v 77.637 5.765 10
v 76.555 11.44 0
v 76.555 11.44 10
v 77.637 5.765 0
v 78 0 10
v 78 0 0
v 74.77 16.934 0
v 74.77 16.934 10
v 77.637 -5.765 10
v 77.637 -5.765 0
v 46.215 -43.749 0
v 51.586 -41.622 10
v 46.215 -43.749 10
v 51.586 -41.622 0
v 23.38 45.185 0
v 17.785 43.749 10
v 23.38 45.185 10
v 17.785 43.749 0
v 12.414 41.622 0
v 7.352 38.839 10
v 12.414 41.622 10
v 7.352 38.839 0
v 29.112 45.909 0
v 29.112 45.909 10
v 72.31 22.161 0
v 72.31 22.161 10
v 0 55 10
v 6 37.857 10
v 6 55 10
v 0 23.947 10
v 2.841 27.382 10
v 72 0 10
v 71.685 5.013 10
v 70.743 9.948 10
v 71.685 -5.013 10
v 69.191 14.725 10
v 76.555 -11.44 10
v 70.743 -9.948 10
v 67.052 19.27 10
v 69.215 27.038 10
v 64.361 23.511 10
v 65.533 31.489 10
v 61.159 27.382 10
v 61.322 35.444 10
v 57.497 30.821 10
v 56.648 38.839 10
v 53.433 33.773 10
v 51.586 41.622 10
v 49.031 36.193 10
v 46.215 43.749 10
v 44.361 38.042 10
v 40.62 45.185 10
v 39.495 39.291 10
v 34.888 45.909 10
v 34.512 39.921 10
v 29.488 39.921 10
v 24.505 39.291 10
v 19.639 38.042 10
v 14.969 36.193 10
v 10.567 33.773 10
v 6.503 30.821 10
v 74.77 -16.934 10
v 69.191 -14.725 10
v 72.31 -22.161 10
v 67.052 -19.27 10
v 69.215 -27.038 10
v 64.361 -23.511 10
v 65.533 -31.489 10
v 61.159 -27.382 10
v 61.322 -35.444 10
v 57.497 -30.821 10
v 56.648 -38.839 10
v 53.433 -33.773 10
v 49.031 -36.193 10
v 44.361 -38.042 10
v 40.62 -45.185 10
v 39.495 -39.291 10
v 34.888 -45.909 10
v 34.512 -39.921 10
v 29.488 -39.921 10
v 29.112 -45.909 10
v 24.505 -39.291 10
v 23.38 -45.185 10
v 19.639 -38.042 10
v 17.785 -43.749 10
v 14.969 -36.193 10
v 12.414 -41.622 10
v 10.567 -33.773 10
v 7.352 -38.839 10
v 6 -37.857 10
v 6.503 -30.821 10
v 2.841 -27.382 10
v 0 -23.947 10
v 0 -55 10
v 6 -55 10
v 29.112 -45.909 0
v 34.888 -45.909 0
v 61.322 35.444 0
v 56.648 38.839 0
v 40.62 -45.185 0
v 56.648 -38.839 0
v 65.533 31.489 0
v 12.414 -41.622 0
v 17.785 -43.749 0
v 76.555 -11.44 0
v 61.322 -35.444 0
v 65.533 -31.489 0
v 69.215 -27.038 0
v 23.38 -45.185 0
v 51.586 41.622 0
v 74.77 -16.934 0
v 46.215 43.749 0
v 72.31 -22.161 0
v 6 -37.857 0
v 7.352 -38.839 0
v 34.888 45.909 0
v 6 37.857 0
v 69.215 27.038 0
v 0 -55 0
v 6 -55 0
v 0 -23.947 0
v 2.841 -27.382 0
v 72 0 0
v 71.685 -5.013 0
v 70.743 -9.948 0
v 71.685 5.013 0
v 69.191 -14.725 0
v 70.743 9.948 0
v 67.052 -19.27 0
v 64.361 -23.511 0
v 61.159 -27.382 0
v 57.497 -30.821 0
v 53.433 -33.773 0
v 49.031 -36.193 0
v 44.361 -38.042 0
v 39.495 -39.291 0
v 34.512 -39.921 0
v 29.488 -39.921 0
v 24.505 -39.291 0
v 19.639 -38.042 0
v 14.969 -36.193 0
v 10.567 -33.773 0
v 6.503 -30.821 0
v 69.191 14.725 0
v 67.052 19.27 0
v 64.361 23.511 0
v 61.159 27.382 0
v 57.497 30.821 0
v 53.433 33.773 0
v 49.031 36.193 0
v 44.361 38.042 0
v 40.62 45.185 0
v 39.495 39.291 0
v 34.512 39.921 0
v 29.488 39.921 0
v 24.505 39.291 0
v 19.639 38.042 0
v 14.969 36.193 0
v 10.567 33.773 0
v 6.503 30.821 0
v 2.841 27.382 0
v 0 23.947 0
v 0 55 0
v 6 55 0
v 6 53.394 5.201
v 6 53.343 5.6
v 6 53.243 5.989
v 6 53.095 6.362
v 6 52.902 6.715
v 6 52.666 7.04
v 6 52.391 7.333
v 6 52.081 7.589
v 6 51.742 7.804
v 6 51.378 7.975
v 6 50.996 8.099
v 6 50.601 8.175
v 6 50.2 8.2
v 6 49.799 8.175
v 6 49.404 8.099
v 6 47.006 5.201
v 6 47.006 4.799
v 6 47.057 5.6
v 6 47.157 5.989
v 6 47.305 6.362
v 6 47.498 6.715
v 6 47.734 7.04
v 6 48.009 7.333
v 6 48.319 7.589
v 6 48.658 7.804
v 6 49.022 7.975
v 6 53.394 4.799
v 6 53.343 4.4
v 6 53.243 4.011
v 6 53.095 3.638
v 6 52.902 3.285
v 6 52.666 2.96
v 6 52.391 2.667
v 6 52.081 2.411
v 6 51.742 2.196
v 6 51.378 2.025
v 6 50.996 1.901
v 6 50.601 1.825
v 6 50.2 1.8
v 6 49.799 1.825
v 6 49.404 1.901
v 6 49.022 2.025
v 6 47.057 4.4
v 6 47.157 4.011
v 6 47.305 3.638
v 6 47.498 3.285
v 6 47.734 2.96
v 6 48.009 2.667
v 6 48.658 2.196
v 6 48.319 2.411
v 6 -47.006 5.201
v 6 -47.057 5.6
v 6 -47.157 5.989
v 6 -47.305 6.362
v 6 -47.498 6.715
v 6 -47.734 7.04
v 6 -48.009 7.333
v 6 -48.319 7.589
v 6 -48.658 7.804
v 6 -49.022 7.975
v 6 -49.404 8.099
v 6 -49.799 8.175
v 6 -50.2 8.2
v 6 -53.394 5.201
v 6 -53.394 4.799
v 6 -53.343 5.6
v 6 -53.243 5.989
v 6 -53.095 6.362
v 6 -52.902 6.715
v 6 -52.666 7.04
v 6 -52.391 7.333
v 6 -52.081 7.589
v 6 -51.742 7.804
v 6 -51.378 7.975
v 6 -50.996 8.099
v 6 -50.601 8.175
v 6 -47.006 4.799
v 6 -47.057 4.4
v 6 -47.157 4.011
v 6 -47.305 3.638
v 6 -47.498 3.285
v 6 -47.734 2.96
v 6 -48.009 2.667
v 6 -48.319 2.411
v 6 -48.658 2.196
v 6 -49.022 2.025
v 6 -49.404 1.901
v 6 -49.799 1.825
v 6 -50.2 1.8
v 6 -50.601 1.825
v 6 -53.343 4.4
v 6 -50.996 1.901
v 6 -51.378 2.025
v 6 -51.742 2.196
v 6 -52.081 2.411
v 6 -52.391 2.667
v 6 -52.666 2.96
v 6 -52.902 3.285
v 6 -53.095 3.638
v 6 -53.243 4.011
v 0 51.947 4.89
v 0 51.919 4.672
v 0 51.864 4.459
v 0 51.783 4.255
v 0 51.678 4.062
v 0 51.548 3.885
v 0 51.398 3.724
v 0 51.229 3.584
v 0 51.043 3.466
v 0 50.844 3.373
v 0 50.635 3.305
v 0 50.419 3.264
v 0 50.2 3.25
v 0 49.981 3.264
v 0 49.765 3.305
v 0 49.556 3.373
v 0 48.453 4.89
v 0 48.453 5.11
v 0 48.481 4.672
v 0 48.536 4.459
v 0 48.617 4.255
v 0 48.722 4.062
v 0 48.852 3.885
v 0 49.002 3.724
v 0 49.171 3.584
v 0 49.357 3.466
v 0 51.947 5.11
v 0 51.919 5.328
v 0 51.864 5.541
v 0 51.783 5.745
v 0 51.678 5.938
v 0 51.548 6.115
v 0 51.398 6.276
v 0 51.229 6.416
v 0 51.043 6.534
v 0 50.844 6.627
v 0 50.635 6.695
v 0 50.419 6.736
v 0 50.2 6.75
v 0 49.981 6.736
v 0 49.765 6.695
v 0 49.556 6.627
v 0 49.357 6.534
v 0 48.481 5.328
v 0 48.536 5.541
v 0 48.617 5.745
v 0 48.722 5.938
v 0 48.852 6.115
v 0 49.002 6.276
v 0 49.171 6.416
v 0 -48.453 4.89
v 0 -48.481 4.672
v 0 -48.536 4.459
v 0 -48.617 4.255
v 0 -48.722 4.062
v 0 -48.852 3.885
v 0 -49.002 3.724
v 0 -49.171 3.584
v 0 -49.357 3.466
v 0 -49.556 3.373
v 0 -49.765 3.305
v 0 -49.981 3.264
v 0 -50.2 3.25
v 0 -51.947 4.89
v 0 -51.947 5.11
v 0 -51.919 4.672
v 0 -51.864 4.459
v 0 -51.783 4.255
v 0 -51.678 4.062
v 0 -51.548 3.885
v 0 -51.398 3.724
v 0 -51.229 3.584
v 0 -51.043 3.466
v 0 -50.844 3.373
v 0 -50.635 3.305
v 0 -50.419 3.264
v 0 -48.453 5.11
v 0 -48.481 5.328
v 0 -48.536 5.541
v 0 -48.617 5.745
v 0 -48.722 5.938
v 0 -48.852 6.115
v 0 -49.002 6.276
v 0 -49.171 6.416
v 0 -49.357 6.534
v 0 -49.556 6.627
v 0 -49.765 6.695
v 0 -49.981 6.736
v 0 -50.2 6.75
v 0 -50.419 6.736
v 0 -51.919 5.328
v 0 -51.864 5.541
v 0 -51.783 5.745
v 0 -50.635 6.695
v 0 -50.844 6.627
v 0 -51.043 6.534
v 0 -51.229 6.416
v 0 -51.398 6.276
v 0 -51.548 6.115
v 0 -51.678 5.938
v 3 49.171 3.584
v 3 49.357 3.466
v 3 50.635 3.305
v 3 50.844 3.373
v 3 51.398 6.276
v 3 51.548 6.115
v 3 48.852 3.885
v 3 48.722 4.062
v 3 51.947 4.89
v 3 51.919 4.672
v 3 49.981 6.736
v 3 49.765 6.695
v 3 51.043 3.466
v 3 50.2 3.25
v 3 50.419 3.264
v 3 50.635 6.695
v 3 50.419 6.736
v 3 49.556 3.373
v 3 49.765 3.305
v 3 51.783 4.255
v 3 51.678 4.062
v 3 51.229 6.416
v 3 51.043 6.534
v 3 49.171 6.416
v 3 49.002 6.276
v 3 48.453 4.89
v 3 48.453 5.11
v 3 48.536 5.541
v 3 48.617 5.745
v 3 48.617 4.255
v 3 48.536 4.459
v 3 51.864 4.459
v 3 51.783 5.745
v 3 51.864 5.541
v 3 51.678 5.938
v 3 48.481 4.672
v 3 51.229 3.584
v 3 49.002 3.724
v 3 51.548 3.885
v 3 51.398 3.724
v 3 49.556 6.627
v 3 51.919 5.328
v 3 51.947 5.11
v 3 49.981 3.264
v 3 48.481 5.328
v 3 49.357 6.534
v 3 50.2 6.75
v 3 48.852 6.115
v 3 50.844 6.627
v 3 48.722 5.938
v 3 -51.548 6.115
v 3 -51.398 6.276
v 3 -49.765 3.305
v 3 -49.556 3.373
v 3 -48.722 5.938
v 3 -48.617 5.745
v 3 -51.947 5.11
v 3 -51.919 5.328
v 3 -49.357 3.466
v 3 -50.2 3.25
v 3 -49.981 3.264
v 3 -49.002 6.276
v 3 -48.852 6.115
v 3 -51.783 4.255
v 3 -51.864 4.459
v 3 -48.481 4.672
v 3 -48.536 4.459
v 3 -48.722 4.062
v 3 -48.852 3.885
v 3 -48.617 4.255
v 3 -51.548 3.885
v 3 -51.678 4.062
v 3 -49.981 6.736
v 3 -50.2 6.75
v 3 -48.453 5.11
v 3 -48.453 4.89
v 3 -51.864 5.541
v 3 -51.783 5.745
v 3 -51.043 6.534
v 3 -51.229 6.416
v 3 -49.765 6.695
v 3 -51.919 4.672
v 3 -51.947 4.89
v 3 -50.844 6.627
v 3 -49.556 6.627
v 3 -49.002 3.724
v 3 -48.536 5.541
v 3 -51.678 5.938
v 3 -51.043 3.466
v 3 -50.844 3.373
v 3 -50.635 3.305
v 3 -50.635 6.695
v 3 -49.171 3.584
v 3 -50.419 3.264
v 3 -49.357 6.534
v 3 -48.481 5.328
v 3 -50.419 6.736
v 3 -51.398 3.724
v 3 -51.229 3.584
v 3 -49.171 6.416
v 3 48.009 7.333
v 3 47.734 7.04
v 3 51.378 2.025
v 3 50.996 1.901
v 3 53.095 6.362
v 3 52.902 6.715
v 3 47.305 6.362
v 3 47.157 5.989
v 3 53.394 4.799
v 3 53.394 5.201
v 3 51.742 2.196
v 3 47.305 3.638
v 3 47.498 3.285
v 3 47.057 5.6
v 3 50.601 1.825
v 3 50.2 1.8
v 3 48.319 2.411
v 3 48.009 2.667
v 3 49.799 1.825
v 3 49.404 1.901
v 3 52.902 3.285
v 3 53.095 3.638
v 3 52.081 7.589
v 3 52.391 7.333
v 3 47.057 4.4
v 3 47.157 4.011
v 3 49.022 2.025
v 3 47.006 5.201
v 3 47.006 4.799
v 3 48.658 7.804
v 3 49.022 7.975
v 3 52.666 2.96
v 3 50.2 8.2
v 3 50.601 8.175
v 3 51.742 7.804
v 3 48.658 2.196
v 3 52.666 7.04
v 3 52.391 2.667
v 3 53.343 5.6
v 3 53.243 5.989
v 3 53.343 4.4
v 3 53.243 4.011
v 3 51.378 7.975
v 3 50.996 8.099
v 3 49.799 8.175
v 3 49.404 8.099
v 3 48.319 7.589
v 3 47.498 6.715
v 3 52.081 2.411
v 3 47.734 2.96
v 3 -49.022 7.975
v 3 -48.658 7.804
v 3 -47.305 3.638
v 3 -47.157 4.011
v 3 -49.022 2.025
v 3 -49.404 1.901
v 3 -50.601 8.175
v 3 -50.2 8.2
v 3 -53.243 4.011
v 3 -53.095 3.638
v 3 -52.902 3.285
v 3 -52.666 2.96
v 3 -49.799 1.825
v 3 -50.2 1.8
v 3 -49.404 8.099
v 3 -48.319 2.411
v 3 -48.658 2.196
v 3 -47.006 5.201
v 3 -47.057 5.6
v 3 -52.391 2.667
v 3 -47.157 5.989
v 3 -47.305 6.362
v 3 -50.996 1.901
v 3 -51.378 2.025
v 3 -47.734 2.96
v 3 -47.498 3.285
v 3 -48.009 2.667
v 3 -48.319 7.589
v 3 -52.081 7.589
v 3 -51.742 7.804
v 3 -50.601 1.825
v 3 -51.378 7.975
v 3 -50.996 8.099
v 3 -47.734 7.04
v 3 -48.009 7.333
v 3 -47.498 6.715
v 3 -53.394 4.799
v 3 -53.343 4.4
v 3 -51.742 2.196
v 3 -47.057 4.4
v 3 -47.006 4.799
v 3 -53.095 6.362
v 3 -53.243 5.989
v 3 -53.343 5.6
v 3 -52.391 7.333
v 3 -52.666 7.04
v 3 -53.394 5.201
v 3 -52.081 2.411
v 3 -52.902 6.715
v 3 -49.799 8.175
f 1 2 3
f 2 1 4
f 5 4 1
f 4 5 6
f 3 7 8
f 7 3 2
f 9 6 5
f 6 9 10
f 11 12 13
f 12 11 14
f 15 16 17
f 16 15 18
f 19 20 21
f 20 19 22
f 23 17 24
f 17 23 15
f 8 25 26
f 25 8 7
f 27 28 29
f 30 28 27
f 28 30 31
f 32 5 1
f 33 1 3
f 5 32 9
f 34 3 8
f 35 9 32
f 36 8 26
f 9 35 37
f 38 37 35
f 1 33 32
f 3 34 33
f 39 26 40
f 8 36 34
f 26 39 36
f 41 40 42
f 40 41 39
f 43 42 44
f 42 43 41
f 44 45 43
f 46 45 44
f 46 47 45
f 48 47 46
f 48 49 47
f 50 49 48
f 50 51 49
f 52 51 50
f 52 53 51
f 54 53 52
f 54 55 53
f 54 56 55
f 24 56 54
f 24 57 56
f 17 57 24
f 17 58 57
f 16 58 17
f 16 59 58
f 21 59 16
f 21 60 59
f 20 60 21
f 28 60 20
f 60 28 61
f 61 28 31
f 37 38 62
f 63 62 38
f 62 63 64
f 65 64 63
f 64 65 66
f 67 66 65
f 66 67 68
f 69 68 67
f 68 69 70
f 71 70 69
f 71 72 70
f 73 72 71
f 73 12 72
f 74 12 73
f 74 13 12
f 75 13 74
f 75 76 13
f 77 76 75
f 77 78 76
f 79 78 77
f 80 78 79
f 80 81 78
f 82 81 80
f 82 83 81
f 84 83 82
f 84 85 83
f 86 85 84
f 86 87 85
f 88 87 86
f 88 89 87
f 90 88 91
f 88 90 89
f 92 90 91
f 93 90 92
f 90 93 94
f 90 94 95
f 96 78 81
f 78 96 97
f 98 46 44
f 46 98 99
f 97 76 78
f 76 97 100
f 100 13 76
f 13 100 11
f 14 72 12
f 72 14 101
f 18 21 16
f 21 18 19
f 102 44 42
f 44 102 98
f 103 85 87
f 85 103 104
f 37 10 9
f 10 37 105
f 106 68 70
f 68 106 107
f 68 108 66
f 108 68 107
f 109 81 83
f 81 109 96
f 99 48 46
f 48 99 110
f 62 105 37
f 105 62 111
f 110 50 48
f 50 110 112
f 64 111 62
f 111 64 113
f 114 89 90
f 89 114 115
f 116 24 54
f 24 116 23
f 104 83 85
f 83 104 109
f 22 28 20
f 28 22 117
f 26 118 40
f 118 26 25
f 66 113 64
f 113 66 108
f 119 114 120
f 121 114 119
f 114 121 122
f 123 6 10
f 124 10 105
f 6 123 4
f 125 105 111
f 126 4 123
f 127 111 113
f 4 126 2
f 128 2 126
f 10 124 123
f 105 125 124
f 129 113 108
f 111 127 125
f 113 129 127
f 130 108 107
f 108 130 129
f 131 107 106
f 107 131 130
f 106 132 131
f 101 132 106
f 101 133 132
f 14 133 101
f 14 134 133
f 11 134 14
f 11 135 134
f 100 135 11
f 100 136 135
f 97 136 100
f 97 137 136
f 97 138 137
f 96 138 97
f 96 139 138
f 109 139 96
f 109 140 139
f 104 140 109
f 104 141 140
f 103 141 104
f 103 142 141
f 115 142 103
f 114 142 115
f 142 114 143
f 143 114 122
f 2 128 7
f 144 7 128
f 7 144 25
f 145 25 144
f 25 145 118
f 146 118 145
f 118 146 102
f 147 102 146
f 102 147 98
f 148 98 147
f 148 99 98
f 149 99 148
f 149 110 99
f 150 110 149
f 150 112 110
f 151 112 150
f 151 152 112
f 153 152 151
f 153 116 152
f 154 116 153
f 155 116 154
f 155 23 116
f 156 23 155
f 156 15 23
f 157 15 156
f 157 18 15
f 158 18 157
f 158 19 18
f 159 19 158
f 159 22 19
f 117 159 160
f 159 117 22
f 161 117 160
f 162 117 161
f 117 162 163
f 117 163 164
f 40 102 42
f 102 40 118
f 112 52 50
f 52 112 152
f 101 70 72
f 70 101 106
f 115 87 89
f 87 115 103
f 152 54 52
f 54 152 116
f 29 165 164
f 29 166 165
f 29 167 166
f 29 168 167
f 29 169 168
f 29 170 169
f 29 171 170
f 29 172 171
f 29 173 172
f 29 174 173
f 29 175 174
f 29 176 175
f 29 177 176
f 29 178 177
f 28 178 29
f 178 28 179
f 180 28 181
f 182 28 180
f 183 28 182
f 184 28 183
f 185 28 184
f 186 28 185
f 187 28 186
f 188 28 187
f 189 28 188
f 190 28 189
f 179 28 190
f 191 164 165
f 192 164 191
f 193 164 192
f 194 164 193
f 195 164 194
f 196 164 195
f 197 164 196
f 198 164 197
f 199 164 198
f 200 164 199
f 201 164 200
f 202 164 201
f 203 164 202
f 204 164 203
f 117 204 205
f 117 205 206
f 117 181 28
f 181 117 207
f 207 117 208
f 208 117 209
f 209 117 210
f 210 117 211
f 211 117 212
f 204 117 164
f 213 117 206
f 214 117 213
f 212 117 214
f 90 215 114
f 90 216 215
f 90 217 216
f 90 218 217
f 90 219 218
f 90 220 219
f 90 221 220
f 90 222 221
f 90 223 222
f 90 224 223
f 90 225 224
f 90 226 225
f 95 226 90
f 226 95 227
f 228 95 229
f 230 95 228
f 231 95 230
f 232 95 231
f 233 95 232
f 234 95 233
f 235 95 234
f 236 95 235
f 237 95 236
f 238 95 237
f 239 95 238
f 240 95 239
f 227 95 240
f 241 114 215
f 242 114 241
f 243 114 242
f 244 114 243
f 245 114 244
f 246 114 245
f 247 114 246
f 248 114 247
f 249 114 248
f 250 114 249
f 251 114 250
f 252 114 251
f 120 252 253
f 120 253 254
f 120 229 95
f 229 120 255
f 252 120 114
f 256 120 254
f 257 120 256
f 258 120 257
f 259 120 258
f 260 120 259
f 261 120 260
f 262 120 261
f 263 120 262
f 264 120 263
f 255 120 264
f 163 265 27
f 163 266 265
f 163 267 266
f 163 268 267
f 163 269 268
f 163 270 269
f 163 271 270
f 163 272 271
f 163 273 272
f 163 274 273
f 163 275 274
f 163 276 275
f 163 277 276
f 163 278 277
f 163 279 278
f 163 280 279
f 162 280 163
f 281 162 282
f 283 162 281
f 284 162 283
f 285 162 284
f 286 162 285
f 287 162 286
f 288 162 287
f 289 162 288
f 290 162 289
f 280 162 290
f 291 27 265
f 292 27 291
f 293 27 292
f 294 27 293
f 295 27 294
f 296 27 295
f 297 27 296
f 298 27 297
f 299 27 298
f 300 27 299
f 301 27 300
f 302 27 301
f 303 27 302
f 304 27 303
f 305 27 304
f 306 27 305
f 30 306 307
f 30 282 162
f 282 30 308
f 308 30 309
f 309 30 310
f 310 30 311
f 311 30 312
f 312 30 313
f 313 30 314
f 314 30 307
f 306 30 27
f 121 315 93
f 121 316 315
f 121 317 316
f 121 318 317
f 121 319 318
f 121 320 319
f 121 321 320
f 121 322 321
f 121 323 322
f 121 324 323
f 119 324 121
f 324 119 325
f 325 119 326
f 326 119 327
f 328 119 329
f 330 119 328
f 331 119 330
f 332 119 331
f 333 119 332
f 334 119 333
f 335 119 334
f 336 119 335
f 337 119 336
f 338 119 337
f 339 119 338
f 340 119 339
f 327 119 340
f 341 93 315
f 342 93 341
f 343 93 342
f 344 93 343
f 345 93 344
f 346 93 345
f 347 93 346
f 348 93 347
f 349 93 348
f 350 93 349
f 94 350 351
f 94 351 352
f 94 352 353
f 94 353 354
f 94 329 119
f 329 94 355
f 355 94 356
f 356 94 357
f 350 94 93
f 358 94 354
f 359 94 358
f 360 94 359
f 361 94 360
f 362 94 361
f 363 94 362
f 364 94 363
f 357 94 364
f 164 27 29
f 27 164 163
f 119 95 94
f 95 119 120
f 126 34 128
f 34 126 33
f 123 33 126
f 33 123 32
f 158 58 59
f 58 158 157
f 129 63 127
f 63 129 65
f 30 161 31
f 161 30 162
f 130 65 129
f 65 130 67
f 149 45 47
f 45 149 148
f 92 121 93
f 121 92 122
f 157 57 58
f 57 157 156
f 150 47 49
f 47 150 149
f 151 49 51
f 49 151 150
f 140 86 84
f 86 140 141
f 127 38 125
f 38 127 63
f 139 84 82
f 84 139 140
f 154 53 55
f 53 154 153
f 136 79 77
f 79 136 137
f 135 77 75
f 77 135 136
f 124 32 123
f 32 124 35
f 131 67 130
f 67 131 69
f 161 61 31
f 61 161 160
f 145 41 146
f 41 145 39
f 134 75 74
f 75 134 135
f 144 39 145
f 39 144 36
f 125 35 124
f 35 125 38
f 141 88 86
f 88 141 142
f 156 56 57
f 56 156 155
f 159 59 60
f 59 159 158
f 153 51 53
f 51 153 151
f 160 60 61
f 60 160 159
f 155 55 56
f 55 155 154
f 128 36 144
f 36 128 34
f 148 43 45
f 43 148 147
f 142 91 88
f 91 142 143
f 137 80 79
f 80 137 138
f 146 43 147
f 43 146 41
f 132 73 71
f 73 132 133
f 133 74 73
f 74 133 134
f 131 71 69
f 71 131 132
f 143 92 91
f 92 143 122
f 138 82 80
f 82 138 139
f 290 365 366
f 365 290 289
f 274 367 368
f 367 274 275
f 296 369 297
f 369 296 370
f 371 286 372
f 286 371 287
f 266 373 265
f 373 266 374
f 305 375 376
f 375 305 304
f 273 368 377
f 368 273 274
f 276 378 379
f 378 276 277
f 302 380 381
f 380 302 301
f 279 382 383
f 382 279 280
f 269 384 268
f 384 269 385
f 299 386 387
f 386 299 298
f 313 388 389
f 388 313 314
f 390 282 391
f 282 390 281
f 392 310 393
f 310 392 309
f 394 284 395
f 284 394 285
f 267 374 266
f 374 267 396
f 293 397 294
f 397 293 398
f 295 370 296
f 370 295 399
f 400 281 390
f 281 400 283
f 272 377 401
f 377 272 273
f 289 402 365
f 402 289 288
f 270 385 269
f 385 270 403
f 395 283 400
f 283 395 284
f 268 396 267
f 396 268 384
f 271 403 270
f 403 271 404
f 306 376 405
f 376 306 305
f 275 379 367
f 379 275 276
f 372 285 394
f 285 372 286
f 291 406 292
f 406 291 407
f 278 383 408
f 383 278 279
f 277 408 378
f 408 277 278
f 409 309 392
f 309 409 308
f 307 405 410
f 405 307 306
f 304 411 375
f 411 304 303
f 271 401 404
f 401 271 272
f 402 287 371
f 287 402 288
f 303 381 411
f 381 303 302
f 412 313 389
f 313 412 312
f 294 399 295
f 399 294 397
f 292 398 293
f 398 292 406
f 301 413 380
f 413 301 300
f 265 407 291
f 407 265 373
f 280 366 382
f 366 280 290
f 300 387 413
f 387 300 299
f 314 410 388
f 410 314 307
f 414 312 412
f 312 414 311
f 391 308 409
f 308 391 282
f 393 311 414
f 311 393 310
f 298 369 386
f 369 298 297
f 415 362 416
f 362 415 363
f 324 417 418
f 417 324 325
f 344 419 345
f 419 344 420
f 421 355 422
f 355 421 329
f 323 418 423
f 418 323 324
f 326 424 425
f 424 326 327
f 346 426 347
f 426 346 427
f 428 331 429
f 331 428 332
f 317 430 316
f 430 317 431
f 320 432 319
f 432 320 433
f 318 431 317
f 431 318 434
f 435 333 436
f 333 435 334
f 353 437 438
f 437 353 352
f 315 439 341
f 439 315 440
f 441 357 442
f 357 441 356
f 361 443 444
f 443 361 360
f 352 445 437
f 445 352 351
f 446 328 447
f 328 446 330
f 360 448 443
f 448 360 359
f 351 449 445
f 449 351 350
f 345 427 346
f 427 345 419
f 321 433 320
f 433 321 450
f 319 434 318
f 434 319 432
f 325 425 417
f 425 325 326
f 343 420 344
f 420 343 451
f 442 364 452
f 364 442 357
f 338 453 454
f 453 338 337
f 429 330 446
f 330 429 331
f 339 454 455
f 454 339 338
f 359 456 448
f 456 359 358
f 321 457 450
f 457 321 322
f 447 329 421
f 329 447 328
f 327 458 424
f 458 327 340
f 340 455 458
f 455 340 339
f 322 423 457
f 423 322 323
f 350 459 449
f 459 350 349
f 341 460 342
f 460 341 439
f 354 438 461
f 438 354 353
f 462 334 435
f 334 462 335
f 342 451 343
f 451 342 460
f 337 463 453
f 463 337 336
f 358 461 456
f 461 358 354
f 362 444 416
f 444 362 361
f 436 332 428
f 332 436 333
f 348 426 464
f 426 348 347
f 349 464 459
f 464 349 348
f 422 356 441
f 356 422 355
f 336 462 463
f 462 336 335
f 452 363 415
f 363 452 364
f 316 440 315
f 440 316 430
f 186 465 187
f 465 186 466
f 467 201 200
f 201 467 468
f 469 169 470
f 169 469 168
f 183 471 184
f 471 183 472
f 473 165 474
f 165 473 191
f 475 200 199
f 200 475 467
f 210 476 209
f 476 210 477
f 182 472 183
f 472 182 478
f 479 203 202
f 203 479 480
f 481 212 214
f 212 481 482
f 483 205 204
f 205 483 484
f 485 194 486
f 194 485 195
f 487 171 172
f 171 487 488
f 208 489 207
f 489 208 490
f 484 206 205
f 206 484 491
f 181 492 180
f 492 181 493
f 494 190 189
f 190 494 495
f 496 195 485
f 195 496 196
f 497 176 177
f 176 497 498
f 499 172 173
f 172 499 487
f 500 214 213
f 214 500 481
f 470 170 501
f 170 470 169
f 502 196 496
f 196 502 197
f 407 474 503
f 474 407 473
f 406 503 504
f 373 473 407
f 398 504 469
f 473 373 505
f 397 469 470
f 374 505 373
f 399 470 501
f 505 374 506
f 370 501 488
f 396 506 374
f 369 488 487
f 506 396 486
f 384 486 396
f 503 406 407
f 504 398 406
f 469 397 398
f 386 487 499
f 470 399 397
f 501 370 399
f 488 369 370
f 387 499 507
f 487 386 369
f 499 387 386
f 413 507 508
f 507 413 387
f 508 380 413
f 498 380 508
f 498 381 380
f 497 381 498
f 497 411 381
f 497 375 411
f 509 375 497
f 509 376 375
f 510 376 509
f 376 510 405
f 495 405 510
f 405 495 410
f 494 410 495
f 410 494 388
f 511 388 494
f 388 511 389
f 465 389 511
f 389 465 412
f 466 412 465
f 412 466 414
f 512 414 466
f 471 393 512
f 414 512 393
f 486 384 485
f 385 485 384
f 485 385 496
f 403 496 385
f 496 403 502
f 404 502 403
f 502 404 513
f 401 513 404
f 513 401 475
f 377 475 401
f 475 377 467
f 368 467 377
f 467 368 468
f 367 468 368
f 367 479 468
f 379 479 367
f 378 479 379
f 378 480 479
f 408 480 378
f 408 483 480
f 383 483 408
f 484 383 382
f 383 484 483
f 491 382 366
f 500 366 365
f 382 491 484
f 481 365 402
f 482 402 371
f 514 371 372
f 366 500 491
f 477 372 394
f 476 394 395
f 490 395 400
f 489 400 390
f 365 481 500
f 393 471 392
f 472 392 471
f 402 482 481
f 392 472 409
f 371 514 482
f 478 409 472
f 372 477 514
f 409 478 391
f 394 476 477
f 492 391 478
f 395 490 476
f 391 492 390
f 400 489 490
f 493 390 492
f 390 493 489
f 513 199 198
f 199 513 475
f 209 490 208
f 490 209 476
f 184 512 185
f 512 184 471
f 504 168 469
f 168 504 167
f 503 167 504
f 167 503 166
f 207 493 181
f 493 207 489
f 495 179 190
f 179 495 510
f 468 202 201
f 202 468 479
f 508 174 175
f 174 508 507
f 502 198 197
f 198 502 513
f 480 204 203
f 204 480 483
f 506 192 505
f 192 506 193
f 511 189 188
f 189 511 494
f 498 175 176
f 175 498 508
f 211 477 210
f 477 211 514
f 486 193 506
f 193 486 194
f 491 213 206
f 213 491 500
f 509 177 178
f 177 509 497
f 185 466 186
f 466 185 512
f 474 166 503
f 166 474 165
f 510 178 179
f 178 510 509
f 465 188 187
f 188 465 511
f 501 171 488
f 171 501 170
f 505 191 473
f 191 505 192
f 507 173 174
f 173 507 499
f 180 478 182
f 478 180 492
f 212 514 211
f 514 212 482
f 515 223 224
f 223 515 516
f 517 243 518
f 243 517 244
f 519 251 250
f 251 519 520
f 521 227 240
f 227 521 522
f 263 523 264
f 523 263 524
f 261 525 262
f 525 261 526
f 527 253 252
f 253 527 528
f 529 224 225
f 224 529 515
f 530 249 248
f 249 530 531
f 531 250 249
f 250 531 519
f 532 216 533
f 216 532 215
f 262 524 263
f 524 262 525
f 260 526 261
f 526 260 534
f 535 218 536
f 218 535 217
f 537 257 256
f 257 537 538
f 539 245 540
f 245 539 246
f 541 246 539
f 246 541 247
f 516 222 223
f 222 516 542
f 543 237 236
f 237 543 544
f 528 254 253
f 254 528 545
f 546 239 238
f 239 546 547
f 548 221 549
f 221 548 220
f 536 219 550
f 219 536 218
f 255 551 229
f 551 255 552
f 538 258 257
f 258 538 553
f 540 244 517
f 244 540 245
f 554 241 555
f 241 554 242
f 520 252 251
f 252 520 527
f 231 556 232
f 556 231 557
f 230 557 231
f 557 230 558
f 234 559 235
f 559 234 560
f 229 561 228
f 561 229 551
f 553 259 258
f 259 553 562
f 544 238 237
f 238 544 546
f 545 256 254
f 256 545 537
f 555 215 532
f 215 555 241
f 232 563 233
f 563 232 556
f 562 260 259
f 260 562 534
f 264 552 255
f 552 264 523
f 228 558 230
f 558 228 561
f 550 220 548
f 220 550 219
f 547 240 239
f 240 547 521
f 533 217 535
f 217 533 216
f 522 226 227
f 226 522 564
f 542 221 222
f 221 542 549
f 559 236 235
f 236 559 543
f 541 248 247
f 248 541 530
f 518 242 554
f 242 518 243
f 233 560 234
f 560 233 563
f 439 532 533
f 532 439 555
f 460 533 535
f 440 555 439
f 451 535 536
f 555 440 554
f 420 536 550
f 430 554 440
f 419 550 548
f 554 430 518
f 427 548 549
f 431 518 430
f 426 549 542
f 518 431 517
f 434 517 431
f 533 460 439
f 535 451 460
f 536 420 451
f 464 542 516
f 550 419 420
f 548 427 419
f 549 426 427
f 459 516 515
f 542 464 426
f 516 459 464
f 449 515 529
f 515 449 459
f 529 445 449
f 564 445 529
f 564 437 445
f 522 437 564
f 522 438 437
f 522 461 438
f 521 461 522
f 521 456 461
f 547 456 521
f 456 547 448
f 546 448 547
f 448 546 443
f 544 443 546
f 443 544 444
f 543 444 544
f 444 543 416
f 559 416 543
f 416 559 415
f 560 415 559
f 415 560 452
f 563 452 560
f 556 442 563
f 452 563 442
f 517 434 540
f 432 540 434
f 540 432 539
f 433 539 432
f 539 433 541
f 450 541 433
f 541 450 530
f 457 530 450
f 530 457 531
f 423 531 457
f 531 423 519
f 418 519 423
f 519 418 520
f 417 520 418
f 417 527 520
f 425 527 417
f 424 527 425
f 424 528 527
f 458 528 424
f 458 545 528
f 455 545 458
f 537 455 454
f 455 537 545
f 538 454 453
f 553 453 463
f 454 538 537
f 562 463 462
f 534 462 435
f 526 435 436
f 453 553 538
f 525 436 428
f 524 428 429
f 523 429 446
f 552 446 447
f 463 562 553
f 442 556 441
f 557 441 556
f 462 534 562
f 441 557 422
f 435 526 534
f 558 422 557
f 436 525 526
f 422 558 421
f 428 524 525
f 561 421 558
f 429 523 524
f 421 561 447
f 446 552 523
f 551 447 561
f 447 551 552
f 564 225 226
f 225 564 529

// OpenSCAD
$fn=50;

//0= round     1=Oval      2=rectangular
Type=0;
//Structure measures
Foot_length=15;
Structure_thickness=6;
Structure_height=10;
//Rounded structure measures
Radius=40;
//Rectangular structure measures
Side_1=20;
Side_2=75;
//Screws measures
Screw_hole_radius=1.75;
Screw_hole_recess_radius=3.2;
Screw_hole_recess_depth=3;


//--------------------------------------------------------------------------------------------------

if(Type==0)
difference()
    {
    union()
        {
        translate([Radius/1.25,0,0])
            cylinder(r=Radius+Structure_thickness,h=Structure_height);
        translate([0,-Radius-Foot_length,0])
            cube([Structure_thickness,Radius*2+Foot_length*2,Structure_height]);
        }

        translate([Radius/1.25,0,-1])
            cylinder(r=Radius,h=Structure_height+2);
        translate([-Radius*4,-Radius*2,-Structure_height/2])
            cube([Radius*4,Radius*4,Structure_height*2]);            

//Screw holes
        translate([-2,Radius+Foot_length-Screw_hole_recess_radius*1.5,Structure_height/2])
            rotate([0,90,0])
            cylinder(r=Screw_hole_radius,h=Structure_height*2);
        translate([-2,-Radius-Foot_length+Screw_hole_recess_radius*1.5,Structure_height/2])
            rotate([0,90,0])
            cylinder(r=Screw_hole_radius,h=Structure_height*2);
//Screw holes recesses
        translate([Structure_thickness-Screw_hole_recess_depth,Radius+Foot_length-Screw_hole_recess_radius*1.5,Structure_height/2])
            rotate([0,90,0])
            cylinder(r=Screw_hole_recess_radius,h=Structure_height);
        translate([Structure_thickness-Screw_hole_recess_depth,-Radius-Foot_length+Screw_hole_recess_radius*1.5,Structure_height/2])
            rotate([0,90,0])
            cylinder(r=Screw_hole_recess_radius,h=Structure_height);

    }

if(Type==1)
difference()
    {
    union()
        {
        scale([0.5,1,1])
        translate([Radius/1.25,0,0])
            cylinder(r=Radius+Structure_thickness,h=Structure_height);
        translate([0,-Radius-Foot_length,0])
            cube([Structure_thickness,Radius*2+Foot_length*2,Structure_height]);
        }

        scale([0.5,1,1])
        translate([Radius/1.25,0,-1])
            cylinder(r=Radius,h=Structure_height+2);
        translate([-Radius*4,-Radius-Foot_length*2,-Structure_height/2])
            cube([Radius*4,Radius*2+Foot_length*4,Structure_height*2]);          

//Screw holes
        translate([-2,Radius+Foot_length-Screw_hole_recess_radius*1.5,Structure_height/2])
            rotate([0,90,0])
            cylinder(r=Screw_hole_radius,h=Structure_height*2);
        translate([-2,-Radius-Foot_length+Screw_hole_recess_radius*1.5,Structure_height/2])
            rotate([0,90,0])
            cylinder(r=Screw_hole_radius,h=Structure_height*2);
//Screw holes recesses
        translate([Structure_thickness-Screw_hole_recess_depth,Radius+Foot_length-Screw_hole_recess_radius*1.5,Structure_height/2])
            rotate([0,90,0])
            cylinder(r=Screw_hole_recess_radius,h=Structure_height);
        translate([Structure_thickness-Screw_hole_recess_depth,-Radius-Foot_length+Screw_hole_recess_radius*1.5,Structure_height/2])
            rotate([0,90,0])
            cylinder(r=Screw_hole_recess_radius,h=Structure_height);
  
    }


if(Type==2)
difference()
    {
    union()
        {
        translate([0,-Side_2/2-Structure_thickness,0])
            cube([Side_1+Structure_thickness,Side_2+Structure_thickness*2,Structure_height]);
        translate([0,-Side_2/2-Structure_thickness-Foot_length,0])
            cube([Structure_thickness,Side_2+Structure_thickness*2+Foot_length*2,Structure_height]);
        }

        translate([-0.1,-Side_2/2,-1])
            cube([Side_1,Side_2,Structure_height+2]);

//Screw holes
        translate([-2,Side_2/2+Structure_thickness+Foot_length-Screw_hole_recess_radius*1.5,Structure_height/2])
            rotate([0,90,0])
            cylinder(r=Screw_hole_radius,h=Structure_height*2);
        translate([-2,-Side_2/2-Structure_thickness-Foot_length+Screw_hole_recess_radius*1.5,Structure_height/2])
            rotate([0,90,0])
            cylinder(r=Screw_hole_radius,h=Structure_height*2);
//Screw holes recesses
        translate([Structure_thickness-Screw_hole_recess_depth,Side_2/2+Structure_thickness+Foot_length-Screw_hole_recess_radius*1.5,Structure_height/2])
            rotate([0,90,0])
            cylinder(r=Screw_hole_recess_radius,h=Structure_height);
        translate([Structure_thickness-Screw_hole_recess_depth,-Side_2/2-Structure_thickness-Foot_length+Screw_hole_recess_radius*1.5,Structure_height/2])
            rotate([0,90,0])
            cylinder(r=Screw_hole_recess_radius,h=Structure_height);
            
    }
